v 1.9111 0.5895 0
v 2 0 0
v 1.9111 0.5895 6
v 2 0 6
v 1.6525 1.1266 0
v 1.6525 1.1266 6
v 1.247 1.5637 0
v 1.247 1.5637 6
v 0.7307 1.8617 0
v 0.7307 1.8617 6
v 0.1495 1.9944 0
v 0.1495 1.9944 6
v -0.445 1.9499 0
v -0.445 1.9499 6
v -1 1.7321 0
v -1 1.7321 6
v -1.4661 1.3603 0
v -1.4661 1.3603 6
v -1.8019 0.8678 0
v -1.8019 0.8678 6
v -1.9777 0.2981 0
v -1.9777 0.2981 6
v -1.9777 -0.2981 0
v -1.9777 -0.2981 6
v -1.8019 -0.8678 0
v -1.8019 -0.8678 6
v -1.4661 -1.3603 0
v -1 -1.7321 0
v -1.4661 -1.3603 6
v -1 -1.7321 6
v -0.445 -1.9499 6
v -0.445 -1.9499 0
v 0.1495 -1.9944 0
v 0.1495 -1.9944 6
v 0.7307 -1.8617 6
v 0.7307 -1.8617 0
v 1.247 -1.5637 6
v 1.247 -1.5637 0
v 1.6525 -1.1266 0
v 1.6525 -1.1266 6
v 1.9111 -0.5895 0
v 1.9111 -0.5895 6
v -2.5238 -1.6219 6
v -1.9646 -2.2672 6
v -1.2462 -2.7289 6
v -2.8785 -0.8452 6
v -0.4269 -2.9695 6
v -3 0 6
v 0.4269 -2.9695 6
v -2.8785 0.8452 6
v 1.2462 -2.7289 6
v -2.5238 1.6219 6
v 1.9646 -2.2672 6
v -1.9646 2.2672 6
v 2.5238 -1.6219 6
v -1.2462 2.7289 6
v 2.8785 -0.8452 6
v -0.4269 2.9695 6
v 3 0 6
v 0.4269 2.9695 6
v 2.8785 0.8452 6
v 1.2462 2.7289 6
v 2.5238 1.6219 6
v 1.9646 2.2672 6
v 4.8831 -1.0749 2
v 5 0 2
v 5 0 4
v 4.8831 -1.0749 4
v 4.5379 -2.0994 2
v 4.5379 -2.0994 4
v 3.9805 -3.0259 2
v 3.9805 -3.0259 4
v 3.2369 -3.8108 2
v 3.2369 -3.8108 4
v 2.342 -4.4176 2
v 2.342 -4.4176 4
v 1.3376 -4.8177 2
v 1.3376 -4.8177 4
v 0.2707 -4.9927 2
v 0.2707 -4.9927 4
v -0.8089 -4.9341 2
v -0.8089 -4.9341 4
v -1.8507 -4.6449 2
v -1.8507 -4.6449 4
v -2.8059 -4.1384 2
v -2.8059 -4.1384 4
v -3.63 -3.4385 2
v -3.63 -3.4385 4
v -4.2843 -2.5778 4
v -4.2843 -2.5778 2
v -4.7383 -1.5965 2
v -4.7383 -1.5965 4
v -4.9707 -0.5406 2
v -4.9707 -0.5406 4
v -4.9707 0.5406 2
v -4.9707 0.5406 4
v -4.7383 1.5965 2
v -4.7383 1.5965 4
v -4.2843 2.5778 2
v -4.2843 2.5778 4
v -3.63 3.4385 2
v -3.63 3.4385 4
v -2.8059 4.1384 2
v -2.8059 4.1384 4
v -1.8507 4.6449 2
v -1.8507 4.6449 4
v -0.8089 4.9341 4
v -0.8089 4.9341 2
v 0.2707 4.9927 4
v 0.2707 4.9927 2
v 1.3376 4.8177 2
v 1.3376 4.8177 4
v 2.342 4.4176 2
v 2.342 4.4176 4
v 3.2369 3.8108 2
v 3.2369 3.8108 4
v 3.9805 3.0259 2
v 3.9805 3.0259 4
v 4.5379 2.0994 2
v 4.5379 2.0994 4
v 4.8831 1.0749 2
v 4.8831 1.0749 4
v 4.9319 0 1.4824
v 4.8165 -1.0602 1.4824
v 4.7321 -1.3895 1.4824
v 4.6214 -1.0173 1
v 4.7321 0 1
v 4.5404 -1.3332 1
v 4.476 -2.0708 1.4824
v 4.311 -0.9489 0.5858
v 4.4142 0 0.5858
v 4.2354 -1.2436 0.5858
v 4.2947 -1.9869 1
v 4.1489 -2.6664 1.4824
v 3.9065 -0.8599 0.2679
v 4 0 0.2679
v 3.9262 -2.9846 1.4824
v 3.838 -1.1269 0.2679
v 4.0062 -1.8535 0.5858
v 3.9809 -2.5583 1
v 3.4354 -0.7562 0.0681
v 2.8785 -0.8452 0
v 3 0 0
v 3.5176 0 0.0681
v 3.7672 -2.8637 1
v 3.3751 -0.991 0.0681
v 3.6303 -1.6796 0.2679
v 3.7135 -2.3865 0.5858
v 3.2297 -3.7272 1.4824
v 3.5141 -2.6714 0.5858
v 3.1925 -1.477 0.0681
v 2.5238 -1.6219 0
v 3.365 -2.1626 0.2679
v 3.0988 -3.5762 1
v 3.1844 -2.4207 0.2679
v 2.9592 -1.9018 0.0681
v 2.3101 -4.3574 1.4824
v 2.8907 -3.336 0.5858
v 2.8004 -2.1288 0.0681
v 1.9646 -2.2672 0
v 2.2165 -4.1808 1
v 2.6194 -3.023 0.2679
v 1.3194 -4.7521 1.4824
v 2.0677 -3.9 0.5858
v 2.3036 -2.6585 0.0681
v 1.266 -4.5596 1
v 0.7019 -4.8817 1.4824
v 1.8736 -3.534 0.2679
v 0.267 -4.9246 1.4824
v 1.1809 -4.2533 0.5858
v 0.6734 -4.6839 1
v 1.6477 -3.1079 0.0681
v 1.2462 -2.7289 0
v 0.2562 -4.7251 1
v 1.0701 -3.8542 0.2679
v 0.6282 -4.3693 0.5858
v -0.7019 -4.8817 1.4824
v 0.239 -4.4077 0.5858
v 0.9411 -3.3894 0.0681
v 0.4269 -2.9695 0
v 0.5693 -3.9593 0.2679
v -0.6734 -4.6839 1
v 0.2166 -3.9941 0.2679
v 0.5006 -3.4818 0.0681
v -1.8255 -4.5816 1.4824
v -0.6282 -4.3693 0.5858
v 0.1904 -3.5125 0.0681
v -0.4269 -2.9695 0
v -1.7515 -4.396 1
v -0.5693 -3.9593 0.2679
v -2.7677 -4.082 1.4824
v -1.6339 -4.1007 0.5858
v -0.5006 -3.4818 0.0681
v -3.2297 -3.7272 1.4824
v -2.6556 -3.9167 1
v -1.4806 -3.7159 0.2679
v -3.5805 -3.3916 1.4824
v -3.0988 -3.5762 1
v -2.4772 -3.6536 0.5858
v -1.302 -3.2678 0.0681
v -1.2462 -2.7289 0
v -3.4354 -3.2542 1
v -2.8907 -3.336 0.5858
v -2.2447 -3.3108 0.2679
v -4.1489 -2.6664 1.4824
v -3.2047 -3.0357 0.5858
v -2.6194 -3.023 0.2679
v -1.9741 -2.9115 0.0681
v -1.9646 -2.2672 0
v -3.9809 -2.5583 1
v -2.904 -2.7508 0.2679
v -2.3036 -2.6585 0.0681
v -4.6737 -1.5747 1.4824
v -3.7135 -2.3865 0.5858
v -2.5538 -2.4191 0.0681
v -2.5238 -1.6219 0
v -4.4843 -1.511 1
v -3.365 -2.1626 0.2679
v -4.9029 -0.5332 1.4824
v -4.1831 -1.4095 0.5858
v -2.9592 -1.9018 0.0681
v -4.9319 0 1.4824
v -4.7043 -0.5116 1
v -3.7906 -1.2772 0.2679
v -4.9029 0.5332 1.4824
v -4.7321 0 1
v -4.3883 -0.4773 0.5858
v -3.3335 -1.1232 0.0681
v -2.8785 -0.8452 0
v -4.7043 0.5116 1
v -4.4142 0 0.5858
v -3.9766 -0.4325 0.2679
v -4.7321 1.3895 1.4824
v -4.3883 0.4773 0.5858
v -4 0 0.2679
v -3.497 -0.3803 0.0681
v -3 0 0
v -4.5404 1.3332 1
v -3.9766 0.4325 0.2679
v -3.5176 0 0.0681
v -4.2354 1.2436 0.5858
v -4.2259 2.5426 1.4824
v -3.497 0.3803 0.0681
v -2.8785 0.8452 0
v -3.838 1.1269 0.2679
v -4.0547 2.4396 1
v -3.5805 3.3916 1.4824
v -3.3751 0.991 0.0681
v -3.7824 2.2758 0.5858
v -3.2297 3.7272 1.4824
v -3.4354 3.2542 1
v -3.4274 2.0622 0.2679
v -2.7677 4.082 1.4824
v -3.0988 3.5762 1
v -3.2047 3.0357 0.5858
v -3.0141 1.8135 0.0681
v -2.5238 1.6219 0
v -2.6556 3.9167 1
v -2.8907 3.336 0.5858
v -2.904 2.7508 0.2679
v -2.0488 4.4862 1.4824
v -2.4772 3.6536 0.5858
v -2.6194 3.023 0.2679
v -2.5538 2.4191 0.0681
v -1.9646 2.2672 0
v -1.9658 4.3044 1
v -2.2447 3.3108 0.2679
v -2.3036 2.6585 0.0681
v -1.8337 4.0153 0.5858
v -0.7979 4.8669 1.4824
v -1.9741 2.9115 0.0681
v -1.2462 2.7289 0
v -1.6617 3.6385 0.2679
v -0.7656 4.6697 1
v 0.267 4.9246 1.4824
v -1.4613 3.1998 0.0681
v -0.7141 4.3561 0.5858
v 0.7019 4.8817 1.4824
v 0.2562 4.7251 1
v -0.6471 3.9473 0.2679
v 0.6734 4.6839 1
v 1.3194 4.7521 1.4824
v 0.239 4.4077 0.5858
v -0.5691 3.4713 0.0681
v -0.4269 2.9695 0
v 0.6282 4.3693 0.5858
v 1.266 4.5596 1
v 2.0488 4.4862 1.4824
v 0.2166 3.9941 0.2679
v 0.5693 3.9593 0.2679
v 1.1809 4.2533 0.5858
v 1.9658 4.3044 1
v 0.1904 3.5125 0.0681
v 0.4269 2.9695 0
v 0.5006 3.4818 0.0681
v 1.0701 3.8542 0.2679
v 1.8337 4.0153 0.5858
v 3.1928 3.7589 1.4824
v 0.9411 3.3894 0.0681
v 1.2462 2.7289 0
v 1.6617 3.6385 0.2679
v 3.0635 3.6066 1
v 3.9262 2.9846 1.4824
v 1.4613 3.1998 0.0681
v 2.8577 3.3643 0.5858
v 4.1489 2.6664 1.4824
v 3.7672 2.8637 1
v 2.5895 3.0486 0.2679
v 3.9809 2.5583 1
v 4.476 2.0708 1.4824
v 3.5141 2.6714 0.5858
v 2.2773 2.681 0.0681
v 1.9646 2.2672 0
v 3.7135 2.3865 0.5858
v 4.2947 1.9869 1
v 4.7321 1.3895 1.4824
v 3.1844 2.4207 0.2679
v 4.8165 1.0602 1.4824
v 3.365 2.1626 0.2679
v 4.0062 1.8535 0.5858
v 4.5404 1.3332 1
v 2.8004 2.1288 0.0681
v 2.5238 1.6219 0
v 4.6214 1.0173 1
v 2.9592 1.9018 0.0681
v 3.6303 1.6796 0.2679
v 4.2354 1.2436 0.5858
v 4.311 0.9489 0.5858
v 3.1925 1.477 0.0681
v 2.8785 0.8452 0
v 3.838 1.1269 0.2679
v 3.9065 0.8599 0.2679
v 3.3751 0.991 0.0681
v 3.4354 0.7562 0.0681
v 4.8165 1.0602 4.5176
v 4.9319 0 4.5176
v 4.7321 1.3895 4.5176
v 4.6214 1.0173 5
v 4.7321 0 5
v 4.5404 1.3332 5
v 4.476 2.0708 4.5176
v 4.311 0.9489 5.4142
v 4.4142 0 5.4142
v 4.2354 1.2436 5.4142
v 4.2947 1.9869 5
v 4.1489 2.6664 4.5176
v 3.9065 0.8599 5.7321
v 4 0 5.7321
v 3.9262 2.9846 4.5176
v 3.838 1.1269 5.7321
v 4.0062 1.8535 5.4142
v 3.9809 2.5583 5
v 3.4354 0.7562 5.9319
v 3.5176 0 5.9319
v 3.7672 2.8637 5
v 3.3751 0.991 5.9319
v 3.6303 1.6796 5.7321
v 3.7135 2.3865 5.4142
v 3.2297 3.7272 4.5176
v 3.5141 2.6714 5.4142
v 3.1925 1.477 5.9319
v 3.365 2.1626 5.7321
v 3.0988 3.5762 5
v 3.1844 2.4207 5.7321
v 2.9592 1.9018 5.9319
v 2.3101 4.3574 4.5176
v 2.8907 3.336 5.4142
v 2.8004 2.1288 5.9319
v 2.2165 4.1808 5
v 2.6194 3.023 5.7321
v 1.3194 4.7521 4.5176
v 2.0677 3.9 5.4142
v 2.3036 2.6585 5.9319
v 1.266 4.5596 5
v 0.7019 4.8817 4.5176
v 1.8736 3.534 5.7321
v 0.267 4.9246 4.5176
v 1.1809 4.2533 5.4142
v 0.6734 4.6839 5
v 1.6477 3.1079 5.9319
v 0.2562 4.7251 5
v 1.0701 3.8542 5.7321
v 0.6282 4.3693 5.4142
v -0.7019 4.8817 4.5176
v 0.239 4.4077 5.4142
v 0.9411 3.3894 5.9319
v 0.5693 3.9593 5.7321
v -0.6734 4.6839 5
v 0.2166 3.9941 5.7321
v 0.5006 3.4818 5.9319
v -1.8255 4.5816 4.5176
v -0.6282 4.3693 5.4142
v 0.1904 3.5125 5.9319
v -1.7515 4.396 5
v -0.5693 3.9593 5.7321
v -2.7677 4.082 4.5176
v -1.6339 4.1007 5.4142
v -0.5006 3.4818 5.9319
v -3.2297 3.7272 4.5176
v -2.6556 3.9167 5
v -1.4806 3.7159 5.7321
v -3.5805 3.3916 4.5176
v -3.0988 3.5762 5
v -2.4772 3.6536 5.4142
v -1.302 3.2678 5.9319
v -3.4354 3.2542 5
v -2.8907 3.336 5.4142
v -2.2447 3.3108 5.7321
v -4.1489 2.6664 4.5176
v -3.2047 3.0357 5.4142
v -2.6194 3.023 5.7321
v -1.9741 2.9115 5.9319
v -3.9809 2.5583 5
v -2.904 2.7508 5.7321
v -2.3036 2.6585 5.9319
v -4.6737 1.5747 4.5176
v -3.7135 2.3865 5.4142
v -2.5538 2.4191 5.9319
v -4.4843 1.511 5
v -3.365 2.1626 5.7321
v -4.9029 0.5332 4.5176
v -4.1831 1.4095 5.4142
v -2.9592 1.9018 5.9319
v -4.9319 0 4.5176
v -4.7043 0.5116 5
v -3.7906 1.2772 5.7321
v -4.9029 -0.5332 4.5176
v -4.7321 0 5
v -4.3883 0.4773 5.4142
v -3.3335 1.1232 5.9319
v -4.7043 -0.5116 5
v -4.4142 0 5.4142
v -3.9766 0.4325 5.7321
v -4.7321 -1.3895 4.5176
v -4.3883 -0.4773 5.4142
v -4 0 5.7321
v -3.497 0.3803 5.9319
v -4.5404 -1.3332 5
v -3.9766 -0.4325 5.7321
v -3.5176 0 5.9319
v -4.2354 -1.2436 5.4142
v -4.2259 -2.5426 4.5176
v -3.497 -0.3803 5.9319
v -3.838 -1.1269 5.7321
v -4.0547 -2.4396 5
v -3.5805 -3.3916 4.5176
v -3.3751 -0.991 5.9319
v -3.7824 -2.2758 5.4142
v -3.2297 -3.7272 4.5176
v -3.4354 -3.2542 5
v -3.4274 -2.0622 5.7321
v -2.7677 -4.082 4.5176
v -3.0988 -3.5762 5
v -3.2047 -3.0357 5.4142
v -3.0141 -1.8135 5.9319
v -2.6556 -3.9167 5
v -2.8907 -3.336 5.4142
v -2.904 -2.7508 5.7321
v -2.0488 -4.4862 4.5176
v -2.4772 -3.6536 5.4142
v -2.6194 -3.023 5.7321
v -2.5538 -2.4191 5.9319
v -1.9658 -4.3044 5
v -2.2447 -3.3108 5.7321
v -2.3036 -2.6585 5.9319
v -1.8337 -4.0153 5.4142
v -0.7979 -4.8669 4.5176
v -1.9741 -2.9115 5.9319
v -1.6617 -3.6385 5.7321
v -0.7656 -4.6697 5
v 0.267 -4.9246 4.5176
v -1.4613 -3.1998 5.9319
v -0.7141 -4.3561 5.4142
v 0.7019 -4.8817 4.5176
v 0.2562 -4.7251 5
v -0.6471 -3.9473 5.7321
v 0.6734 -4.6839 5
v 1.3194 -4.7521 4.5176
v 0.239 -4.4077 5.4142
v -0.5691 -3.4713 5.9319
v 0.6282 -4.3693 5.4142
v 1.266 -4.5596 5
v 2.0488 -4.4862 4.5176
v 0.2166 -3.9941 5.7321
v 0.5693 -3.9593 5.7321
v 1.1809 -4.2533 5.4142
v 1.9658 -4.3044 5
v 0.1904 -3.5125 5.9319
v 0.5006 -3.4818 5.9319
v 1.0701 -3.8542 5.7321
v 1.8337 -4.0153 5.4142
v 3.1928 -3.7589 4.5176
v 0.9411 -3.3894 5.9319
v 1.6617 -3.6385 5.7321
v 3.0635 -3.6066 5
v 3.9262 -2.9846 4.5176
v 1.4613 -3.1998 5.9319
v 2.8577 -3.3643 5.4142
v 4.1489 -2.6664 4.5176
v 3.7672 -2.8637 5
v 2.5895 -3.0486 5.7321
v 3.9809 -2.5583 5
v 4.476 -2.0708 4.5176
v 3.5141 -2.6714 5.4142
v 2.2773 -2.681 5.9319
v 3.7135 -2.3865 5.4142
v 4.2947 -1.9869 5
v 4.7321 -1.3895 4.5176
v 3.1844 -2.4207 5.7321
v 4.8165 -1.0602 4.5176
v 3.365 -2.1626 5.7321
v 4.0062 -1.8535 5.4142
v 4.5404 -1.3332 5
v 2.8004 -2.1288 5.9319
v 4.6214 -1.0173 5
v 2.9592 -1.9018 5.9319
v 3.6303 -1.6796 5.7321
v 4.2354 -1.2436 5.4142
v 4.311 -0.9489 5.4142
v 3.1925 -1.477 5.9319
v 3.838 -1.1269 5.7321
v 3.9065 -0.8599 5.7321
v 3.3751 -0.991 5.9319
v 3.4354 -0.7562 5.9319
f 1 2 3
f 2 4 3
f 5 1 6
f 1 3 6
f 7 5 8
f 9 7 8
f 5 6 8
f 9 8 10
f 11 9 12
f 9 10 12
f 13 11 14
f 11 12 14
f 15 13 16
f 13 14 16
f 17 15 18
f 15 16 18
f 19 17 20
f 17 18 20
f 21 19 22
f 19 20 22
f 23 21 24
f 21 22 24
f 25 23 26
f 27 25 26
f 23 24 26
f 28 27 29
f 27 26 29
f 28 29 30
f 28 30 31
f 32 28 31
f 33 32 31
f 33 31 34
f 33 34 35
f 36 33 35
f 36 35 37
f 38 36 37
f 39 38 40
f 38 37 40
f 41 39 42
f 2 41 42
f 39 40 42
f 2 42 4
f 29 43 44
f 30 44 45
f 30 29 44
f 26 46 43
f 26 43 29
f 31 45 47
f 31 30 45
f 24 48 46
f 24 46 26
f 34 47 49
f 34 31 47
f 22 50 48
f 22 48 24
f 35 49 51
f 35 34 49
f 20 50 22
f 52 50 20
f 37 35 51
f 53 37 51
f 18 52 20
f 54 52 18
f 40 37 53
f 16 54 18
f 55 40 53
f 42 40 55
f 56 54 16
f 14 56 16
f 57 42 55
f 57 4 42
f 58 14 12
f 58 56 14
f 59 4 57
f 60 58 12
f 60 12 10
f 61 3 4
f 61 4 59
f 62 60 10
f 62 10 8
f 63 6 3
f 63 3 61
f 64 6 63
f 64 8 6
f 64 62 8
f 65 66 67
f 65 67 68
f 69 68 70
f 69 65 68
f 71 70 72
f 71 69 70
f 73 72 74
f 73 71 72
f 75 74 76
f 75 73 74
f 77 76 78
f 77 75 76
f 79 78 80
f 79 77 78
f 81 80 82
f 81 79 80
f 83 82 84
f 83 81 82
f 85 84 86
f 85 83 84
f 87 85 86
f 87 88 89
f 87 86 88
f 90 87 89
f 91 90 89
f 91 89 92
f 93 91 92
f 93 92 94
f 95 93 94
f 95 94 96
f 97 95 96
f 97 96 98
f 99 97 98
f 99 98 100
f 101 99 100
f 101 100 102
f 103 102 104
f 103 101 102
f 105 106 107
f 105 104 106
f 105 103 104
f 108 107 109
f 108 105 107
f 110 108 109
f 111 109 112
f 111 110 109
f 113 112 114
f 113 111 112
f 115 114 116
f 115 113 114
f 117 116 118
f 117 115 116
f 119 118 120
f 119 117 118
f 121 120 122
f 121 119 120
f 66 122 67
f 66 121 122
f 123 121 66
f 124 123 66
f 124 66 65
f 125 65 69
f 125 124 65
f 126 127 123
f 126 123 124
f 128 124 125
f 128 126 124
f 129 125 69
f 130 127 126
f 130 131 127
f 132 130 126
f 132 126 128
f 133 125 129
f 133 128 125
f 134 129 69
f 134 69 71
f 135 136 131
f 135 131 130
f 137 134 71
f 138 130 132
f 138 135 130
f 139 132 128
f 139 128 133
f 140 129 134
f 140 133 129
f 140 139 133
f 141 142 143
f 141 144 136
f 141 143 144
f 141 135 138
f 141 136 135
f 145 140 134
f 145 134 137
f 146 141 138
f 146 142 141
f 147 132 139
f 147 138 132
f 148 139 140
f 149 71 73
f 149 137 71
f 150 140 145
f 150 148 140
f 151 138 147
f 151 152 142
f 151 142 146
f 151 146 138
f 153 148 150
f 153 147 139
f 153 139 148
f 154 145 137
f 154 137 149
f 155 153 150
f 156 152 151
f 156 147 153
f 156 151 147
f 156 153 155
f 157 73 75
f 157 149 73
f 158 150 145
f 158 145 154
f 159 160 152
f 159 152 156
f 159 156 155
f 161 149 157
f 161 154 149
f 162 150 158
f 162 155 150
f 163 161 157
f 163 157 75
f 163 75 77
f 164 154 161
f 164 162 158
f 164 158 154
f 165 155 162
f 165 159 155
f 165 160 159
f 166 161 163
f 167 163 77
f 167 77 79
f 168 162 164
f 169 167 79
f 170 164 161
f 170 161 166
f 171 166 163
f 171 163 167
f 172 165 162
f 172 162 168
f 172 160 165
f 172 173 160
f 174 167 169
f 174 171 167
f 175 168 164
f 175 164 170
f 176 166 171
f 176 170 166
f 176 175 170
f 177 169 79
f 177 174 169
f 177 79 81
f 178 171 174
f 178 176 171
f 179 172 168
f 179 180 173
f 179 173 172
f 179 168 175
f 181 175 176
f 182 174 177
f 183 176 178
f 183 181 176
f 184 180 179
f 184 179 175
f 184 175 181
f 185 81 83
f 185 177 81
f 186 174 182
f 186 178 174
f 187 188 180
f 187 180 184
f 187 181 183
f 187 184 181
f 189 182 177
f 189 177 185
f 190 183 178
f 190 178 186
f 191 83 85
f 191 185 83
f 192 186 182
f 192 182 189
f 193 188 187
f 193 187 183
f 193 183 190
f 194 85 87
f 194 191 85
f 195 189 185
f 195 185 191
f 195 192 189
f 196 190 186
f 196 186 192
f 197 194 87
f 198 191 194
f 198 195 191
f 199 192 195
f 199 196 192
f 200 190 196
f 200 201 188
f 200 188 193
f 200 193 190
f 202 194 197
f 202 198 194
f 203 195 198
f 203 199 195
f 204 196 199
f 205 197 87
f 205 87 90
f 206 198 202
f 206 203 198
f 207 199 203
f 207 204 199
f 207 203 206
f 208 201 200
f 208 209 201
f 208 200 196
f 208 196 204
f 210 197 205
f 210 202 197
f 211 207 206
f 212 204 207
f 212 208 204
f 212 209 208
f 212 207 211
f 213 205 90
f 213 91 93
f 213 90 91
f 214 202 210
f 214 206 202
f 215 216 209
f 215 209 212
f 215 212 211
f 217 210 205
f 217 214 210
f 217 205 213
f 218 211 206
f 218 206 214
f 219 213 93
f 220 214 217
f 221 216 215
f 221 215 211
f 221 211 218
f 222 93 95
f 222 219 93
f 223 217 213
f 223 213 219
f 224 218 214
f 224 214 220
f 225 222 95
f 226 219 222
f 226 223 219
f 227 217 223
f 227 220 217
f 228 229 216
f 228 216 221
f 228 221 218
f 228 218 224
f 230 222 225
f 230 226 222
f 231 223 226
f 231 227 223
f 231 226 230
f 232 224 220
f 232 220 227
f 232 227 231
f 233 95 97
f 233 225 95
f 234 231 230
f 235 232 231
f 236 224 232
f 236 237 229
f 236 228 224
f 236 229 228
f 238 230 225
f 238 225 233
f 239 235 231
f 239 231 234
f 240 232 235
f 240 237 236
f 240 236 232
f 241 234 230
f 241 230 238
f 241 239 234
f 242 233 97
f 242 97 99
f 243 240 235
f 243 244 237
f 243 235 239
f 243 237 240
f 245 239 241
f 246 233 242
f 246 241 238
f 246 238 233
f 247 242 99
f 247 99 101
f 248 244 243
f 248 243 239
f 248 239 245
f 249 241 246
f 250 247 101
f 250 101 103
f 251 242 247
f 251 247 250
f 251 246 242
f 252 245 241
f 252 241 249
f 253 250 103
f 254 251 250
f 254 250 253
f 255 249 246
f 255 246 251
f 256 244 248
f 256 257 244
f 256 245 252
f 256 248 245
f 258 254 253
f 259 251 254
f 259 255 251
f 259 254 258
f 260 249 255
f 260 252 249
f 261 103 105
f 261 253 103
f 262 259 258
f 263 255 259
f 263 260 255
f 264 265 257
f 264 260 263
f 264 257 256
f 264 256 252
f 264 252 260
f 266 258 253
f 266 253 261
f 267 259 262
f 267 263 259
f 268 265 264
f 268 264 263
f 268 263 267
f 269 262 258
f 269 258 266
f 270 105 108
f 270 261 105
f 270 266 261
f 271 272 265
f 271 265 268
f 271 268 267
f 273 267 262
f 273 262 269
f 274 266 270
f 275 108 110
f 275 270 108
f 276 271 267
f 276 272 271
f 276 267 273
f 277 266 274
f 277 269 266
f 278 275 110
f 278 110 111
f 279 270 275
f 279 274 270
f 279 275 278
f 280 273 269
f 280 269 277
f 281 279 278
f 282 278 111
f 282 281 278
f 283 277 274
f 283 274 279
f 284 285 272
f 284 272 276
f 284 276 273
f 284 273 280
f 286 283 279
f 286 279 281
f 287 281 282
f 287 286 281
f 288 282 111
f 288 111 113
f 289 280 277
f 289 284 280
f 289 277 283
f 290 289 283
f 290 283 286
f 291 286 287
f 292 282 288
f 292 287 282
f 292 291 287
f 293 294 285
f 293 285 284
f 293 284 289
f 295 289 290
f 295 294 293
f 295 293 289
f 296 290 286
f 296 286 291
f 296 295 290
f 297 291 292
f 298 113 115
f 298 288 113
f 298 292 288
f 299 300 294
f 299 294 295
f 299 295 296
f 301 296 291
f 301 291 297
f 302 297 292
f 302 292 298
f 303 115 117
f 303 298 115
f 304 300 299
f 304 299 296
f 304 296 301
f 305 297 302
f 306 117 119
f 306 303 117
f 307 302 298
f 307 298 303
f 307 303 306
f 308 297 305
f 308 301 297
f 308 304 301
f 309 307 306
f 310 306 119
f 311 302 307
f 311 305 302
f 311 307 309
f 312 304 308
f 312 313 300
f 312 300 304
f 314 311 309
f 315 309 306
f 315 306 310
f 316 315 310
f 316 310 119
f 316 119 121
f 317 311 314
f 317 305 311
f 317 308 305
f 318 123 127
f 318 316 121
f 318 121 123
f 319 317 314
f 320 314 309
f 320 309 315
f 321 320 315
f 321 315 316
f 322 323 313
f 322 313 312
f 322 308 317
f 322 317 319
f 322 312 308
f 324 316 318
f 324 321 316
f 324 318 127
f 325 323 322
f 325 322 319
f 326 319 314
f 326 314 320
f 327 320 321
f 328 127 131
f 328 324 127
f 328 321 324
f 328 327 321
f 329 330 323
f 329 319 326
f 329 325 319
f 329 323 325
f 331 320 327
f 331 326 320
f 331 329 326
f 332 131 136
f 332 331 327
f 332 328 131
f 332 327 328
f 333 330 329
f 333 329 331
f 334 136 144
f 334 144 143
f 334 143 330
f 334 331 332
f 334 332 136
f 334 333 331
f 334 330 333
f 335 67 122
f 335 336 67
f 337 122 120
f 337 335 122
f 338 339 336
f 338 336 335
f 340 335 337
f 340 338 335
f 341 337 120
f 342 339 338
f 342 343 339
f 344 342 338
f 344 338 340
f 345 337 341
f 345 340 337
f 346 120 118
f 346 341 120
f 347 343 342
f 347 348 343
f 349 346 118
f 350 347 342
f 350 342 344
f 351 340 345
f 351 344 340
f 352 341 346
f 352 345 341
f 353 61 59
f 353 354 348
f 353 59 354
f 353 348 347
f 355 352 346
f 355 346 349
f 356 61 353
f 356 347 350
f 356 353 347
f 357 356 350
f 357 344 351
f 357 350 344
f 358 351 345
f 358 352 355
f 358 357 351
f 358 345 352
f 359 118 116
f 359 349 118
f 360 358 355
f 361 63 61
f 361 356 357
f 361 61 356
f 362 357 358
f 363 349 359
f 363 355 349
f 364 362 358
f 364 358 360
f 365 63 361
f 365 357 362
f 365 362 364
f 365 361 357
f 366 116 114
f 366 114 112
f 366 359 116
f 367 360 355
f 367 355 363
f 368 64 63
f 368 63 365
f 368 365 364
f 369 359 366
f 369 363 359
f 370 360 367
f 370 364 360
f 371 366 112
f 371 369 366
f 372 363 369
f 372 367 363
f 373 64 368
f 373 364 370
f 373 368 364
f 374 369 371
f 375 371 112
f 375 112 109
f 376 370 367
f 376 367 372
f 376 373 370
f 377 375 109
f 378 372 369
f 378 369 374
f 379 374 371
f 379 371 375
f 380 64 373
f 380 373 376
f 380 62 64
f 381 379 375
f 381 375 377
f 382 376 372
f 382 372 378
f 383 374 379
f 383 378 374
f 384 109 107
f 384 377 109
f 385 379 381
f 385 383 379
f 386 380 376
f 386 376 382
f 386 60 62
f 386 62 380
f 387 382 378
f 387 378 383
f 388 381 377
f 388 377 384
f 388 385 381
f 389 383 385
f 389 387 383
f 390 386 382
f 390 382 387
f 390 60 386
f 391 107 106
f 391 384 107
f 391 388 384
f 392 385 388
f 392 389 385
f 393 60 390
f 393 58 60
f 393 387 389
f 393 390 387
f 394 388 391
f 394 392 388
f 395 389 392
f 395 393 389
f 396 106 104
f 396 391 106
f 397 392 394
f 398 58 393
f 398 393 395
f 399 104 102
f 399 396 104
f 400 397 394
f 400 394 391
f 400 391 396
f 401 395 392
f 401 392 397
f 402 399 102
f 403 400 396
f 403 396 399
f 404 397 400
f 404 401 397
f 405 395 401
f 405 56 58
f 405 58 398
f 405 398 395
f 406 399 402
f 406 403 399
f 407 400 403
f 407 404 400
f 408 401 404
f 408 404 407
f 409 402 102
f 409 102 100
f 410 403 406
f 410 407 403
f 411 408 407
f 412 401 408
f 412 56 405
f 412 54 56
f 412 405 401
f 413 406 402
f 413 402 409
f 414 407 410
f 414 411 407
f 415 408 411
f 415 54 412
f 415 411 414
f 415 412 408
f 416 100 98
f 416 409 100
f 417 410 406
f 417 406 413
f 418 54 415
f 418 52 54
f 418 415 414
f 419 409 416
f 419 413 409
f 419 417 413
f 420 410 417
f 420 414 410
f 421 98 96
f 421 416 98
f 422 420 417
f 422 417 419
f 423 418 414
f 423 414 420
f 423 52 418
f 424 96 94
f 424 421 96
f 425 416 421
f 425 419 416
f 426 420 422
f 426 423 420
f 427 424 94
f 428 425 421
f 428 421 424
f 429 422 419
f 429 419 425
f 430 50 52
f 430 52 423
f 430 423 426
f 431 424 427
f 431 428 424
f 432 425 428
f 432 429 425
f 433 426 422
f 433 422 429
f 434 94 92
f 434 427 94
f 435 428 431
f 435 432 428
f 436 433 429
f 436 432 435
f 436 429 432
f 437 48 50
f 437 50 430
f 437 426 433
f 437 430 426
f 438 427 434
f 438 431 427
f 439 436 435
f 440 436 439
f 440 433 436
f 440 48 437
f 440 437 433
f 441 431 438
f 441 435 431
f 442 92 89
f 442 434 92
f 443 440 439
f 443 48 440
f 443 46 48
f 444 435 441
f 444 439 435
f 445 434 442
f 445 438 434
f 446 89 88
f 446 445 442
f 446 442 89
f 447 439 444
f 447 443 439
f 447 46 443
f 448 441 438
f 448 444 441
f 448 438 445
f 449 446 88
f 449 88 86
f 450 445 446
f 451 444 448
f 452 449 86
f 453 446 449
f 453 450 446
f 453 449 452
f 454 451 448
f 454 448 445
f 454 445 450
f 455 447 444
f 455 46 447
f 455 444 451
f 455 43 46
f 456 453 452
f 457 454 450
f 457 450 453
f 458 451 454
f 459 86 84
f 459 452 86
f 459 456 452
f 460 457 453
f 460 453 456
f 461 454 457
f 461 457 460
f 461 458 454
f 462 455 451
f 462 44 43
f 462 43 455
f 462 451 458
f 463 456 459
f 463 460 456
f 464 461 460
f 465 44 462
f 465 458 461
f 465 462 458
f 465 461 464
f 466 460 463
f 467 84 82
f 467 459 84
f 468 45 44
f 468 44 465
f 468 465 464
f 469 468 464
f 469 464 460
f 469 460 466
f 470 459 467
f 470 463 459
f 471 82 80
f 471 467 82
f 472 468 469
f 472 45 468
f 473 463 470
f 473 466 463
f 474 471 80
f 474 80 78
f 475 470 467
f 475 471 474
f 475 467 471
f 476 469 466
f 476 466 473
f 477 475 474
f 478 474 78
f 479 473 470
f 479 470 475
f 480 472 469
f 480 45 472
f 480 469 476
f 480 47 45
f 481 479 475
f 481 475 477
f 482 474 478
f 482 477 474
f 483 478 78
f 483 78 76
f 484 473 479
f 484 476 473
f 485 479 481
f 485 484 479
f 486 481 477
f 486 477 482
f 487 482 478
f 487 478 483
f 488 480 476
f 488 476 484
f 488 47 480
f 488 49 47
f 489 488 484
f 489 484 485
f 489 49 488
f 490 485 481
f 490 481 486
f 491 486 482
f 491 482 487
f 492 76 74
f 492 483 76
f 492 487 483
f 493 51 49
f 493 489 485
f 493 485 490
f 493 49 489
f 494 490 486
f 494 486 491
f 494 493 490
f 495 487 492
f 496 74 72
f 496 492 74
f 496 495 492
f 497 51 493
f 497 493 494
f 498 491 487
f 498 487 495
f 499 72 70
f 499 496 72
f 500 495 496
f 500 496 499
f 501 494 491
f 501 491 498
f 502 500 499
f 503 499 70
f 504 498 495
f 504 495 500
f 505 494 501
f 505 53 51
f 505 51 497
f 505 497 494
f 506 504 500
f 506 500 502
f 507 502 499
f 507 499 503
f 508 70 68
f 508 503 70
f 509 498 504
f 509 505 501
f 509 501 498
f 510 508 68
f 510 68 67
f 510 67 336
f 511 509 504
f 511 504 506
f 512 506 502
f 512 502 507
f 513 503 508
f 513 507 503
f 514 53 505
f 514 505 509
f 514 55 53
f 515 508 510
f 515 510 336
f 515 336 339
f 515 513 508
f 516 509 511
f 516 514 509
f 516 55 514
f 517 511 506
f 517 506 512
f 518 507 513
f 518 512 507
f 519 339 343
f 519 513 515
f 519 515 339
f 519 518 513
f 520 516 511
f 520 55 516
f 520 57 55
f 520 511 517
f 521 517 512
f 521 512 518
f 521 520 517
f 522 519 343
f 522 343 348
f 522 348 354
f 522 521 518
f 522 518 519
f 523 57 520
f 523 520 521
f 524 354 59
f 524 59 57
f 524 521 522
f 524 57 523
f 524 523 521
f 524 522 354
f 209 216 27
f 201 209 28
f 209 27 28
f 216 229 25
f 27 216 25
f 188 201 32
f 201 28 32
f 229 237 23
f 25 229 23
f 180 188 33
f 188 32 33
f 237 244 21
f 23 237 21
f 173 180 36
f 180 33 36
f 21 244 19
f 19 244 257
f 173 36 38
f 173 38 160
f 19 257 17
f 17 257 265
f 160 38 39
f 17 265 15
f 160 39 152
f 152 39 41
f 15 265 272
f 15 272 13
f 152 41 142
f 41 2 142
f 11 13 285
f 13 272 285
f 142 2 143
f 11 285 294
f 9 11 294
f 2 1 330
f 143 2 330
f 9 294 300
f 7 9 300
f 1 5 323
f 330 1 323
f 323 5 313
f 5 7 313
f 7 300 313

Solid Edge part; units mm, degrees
sketch "Sketch1" plane through (0, 0, 0) normal (0, 0, 1) x (1, 0, 0)
  circle A0 centre (0, 0) radius 5
extrude "Protrusion1" add sketch "Sketch1" along normal blind 6
sketch "Sketch2" plane through (0, 0, 6) normal (0, 0, 1) x (1, 0, 0)
  circle A0 centre (0, 0) radius 2
extrude "Cutout1" cut sketch "Sketch2" against normal up to vertex (6 mm away)
fillet "Round_1" radius 2 1 edges at (-5, 0, 6)
fillet "Round_2" radius 2 1 edges at (-5, 0, 0)
